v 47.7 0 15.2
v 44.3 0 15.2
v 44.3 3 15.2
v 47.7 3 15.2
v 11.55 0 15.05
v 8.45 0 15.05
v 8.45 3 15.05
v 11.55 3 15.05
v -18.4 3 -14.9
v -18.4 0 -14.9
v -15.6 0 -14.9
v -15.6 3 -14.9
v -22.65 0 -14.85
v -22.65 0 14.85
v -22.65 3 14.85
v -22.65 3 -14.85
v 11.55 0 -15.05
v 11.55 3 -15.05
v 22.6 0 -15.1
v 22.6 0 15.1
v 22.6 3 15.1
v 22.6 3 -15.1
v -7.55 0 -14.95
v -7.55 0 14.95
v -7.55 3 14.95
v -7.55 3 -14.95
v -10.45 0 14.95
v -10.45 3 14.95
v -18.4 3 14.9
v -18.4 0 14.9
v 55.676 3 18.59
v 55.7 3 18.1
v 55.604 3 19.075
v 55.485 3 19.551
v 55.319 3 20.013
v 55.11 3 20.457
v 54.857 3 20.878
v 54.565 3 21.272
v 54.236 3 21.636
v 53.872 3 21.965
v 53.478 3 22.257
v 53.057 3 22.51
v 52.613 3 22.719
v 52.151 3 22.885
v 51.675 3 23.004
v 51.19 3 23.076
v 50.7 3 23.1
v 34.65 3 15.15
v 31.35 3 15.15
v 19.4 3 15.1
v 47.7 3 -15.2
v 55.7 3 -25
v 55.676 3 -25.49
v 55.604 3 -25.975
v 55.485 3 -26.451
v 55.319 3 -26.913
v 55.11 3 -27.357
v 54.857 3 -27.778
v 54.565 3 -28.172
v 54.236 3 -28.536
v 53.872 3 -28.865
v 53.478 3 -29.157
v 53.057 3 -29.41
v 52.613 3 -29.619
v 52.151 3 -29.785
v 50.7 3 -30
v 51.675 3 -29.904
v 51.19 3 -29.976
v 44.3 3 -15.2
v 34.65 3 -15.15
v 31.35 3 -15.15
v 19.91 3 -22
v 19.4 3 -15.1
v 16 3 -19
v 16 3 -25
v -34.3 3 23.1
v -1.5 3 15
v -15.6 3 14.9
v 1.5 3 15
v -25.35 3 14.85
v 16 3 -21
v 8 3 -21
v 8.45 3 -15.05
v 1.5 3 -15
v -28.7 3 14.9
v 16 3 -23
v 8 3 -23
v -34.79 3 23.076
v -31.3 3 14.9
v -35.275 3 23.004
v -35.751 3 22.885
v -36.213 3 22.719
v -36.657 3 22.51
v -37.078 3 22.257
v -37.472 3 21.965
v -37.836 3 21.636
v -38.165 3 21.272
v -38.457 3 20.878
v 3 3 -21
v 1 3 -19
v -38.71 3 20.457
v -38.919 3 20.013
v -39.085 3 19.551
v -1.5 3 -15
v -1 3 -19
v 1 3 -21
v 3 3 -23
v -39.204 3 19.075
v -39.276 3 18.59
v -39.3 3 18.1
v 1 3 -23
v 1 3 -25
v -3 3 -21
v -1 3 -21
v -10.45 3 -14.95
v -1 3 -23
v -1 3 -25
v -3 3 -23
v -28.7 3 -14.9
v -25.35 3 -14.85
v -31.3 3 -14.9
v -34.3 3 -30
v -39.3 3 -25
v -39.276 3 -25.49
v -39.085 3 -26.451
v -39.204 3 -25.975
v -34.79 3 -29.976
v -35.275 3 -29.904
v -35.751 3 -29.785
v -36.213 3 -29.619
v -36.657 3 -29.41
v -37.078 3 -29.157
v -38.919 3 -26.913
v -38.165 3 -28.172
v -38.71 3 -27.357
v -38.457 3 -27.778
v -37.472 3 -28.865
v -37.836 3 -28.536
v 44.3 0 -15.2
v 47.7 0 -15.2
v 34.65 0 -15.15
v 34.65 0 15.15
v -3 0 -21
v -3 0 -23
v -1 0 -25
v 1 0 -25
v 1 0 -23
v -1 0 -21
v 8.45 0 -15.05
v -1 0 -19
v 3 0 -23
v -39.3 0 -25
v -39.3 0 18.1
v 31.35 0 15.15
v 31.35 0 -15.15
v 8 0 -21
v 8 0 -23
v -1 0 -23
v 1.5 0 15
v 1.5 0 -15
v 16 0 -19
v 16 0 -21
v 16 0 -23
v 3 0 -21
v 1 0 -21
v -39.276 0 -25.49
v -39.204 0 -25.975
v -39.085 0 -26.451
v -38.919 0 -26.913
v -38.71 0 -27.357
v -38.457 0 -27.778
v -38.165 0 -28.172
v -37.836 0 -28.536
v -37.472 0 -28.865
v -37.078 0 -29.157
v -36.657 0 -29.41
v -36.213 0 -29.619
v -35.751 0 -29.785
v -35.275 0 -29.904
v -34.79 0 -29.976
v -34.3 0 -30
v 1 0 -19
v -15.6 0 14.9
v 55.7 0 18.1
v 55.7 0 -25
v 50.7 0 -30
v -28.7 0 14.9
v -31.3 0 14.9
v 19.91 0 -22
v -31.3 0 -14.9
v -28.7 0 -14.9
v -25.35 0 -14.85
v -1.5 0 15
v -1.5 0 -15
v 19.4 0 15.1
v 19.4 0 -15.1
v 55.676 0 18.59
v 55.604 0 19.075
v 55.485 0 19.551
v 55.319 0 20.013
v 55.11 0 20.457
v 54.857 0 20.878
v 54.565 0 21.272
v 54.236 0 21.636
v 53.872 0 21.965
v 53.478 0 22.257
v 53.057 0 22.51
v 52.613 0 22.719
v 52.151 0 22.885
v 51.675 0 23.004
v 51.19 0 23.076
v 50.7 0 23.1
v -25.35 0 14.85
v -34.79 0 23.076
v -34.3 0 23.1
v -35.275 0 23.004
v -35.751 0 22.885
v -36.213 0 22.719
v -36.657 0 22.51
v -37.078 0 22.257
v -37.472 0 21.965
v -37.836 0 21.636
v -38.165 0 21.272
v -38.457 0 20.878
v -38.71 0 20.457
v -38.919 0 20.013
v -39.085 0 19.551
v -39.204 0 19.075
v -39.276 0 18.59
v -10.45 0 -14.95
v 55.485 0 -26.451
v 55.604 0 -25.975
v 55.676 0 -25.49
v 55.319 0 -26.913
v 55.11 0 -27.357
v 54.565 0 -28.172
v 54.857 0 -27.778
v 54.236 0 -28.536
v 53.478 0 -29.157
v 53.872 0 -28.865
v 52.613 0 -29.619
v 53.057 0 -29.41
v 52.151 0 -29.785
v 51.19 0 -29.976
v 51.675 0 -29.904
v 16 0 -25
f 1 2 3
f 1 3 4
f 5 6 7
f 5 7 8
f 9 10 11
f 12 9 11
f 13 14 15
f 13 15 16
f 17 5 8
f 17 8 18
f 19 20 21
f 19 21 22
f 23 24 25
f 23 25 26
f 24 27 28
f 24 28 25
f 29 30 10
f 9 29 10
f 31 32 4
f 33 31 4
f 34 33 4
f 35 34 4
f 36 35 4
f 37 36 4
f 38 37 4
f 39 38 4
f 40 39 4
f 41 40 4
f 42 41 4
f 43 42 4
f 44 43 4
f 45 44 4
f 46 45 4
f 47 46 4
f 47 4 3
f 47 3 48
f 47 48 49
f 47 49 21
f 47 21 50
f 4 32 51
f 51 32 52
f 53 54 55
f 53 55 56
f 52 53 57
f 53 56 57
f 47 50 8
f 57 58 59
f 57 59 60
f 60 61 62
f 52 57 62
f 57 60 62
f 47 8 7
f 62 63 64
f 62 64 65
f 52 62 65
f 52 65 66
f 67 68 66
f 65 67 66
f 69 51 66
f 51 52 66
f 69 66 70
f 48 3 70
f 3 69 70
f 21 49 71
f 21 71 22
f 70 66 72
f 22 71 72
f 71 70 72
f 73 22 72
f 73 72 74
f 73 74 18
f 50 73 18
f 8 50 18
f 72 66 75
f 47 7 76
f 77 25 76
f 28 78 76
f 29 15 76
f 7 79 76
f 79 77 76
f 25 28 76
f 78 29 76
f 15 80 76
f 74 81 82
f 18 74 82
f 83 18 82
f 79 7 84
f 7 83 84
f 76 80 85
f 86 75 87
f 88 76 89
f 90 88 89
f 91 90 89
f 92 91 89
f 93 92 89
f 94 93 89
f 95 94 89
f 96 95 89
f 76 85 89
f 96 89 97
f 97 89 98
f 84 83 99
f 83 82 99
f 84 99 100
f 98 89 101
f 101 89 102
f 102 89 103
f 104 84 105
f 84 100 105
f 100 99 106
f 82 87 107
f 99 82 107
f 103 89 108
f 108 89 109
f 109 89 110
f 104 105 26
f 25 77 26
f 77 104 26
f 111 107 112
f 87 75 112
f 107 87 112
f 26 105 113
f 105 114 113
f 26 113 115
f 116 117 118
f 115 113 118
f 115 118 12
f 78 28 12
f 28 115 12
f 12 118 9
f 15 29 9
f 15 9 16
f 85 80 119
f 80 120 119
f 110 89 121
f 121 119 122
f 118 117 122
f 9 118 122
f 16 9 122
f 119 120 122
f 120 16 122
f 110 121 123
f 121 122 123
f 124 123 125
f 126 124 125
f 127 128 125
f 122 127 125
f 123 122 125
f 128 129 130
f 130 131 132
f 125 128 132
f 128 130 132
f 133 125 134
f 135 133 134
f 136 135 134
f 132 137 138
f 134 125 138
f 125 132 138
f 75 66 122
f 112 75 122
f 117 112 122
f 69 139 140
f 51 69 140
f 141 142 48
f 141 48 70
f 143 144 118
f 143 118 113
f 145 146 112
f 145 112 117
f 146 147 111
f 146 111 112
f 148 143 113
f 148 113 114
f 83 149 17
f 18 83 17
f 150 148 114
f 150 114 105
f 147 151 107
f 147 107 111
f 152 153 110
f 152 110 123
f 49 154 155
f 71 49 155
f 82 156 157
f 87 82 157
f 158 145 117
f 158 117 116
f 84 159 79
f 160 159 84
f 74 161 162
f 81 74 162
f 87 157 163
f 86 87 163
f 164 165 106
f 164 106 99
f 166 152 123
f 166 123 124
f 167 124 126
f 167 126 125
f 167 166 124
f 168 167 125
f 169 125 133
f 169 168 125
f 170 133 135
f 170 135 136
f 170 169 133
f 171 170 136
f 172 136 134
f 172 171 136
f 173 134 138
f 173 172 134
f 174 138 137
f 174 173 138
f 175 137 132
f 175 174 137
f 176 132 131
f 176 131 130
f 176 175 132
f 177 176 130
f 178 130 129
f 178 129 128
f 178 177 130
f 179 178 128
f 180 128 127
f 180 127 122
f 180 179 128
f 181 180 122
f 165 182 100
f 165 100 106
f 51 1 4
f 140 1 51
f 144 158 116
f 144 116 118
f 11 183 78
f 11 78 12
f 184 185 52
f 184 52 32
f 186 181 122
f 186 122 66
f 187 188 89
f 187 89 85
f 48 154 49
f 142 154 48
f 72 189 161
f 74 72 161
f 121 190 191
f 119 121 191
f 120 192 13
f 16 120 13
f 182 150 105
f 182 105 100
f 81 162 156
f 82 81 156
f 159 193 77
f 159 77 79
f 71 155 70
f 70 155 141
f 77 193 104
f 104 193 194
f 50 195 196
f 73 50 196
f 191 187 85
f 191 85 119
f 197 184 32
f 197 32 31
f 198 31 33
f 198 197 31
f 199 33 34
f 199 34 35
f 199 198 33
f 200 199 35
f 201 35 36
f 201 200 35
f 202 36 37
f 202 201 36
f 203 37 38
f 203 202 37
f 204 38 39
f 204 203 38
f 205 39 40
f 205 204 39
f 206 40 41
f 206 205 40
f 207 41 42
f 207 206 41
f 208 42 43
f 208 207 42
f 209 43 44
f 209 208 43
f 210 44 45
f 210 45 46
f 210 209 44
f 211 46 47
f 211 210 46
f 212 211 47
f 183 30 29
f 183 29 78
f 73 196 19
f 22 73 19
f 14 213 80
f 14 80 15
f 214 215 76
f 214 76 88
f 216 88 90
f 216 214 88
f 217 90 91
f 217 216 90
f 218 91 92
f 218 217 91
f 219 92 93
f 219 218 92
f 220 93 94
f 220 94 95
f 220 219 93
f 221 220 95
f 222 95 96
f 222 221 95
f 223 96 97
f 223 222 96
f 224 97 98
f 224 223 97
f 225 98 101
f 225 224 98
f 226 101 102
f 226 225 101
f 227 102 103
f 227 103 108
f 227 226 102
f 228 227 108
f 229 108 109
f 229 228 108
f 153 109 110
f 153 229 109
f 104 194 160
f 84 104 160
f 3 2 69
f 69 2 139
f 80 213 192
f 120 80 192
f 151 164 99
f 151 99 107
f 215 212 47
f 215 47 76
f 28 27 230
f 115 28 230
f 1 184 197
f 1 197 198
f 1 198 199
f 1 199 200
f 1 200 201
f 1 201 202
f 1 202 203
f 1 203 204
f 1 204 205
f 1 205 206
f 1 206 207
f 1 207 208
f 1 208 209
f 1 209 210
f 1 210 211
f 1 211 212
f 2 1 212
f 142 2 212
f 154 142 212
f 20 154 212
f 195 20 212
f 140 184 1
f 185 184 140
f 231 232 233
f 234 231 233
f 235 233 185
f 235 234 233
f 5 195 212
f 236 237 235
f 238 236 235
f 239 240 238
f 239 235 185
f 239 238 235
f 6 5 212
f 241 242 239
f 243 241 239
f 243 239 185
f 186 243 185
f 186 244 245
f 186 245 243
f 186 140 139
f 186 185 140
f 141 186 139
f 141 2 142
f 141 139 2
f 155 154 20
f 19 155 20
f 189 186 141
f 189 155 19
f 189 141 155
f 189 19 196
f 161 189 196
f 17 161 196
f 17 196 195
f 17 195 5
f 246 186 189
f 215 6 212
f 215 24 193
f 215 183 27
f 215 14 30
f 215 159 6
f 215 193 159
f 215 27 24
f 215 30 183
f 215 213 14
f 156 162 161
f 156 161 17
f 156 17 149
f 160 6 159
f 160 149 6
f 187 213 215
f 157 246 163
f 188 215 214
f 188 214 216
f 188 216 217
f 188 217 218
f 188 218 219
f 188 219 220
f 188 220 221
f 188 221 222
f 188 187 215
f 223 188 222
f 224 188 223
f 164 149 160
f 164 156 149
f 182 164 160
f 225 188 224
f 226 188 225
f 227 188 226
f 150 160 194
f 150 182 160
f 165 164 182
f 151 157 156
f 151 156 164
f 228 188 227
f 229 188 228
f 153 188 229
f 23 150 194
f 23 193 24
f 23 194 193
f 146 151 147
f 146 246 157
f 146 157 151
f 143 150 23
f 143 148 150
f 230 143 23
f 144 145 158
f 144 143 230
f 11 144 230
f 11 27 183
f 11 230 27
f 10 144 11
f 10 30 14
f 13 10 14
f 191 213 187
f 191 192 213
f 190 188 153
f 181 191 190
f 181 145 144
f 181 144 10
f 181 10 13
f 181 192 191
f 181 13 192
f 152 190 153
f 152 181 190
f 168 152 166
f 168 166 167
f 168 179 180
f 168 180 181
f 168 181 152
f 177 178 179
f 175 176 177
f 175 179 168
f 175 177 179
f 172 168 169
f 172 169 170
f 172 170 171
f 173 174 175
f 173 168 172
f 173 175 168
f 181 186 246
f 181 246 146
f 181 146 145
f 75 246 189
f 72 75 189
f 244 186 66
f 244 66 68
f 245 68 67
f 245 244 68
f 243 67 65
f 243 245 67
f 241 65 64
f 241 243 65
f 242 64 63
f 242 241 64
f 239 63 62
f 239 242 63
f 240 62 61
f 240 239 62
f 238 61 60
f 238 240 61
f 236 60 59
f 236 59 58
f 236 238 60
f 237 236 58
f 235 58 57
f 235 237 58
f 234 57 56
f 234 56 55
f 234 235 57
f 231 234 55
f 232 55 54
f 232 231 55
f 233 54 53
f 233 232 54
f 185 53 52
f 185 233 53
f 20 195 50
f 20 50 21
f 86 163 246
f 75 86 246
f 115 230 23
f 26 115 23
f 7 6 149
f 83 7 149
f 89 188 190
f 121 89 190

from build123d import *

# Parameters (mm, degrees)
SKETCH1_W           = 2.7
SKETCH1_H           = 29.7
SKETCH1_W_2         = 2.8
SKETCH1_H_2         = 29.8
SKETCH1_W_3         = 2.9
SKETCH1_H_3         = 29.9
SKETCH1_W_4         = 3
SKETCH1_H_4         = 30
SKETCH1_W_5         = 3.1
SKETCH1_H_5         = 30.1
SKETCH1_W_6         = 3.2
SKETCH1_H_6         = 30.2
SKETCH1_W_7         = 3.3
SKETCH1_H_7         = 30.3
SKETCH1_W_8         = 2.6
SKETCH1_W_9         = 3.4
SKETCH1_H_8         = 30.4
BOSS_EXTRUDE1_DEPTH = 3


with BuildPart() as part:
    # Sketch1 → Boss-Extrude1 (new body)
    with BuildSketch(Plane(origin=(0, 0, 0), x_dir=(1, 0, 0), z_dir=(0, 1, 0))):
        with BuildLine():
            Line((50.7, -23.1), (-34.3, -23.1))
            ThreePointArc((-34.3, -23.1), (-37.835533906, -21.635533906), (-39.3, -18.1))
            Line((-39.3, -18.1), (-39.3, 25))
            ThreePointArc((-39.3, 25), (-37.835533906, 28.535533906), (-34.3, 30))
            Line((-34.3, 30), (50.7, 30))
            ThreePointArc((50.7, 30), (54.235533906, 28.535533906), (55.7, 25))
            Line((55.7, 25), (55.7, -18.1))
            ThreePointArc((55.7, -18.1), (54.235533906, -21.635533906), (50.7, -23.1))
        make_face()
        Polygon((1, 21), (3, 21), (3, 23), (1, 23), (1, 25), (-1, 25), (-1, 23), (-3, 23), (-3, 21), (-1, 21), (-1, 19), (1, 19), align=None, mode=Mode.SUBTRACT)
        with Locations((-24, 0)):
            Rectangle(SKETCH1_W, SKETCH1_H, mode=Mode.SUBTRACT)
        with Locations((-17, 0)):
            Rectangle(SKETCH1_W_2, SKETCH1_H_2, mode=Mode.SUBTRACT)
        with Locations((-9, 0)):
            Rectangle(SKETCH1_W_3, SKETCH1_H_3, mode=Mode.SUBTRACT)
        Rectangle(SKETCH1_W_4, SKETCH1_H_4, mode=Mode.SUBTRACT)
        with Locations((10, 0)):
            Rectangle(SKETCH1_W_5, SKETCH1_H_5, mode=Mode.SUBTRACT)
        with Locations((21, 0)):
            Rectangle(SKETCH1_W_6, SKETCH1_H_6, mode=Mode.SUBTRACT)
        with Locations((33, 0)):
            Rectangle(SKETCH1_W_7, SKETCH1_H_7, mode=Mode.SUBTRACT)
        with Locations((-30, 0)):
            Rectangle(SKETCH1_W_8, SKETCH1_H_2, mode=Mode.SUBTRACT)
        with Locations((46, 0)):
            Rectangle(SKETCH1_W_9, SKETCH1_H_8, mode=Mode.SUBTRACT)
        Polygon((16, 23), (16, 25), (19.909676119, 22), (16, 19), (16, 21), (8, 21), (8, 23), align=None, mode=Mode.SUBTRACT)
    extrude(amount=BOSS_EXTRUDE1_DEPTH)


solid = part.part
